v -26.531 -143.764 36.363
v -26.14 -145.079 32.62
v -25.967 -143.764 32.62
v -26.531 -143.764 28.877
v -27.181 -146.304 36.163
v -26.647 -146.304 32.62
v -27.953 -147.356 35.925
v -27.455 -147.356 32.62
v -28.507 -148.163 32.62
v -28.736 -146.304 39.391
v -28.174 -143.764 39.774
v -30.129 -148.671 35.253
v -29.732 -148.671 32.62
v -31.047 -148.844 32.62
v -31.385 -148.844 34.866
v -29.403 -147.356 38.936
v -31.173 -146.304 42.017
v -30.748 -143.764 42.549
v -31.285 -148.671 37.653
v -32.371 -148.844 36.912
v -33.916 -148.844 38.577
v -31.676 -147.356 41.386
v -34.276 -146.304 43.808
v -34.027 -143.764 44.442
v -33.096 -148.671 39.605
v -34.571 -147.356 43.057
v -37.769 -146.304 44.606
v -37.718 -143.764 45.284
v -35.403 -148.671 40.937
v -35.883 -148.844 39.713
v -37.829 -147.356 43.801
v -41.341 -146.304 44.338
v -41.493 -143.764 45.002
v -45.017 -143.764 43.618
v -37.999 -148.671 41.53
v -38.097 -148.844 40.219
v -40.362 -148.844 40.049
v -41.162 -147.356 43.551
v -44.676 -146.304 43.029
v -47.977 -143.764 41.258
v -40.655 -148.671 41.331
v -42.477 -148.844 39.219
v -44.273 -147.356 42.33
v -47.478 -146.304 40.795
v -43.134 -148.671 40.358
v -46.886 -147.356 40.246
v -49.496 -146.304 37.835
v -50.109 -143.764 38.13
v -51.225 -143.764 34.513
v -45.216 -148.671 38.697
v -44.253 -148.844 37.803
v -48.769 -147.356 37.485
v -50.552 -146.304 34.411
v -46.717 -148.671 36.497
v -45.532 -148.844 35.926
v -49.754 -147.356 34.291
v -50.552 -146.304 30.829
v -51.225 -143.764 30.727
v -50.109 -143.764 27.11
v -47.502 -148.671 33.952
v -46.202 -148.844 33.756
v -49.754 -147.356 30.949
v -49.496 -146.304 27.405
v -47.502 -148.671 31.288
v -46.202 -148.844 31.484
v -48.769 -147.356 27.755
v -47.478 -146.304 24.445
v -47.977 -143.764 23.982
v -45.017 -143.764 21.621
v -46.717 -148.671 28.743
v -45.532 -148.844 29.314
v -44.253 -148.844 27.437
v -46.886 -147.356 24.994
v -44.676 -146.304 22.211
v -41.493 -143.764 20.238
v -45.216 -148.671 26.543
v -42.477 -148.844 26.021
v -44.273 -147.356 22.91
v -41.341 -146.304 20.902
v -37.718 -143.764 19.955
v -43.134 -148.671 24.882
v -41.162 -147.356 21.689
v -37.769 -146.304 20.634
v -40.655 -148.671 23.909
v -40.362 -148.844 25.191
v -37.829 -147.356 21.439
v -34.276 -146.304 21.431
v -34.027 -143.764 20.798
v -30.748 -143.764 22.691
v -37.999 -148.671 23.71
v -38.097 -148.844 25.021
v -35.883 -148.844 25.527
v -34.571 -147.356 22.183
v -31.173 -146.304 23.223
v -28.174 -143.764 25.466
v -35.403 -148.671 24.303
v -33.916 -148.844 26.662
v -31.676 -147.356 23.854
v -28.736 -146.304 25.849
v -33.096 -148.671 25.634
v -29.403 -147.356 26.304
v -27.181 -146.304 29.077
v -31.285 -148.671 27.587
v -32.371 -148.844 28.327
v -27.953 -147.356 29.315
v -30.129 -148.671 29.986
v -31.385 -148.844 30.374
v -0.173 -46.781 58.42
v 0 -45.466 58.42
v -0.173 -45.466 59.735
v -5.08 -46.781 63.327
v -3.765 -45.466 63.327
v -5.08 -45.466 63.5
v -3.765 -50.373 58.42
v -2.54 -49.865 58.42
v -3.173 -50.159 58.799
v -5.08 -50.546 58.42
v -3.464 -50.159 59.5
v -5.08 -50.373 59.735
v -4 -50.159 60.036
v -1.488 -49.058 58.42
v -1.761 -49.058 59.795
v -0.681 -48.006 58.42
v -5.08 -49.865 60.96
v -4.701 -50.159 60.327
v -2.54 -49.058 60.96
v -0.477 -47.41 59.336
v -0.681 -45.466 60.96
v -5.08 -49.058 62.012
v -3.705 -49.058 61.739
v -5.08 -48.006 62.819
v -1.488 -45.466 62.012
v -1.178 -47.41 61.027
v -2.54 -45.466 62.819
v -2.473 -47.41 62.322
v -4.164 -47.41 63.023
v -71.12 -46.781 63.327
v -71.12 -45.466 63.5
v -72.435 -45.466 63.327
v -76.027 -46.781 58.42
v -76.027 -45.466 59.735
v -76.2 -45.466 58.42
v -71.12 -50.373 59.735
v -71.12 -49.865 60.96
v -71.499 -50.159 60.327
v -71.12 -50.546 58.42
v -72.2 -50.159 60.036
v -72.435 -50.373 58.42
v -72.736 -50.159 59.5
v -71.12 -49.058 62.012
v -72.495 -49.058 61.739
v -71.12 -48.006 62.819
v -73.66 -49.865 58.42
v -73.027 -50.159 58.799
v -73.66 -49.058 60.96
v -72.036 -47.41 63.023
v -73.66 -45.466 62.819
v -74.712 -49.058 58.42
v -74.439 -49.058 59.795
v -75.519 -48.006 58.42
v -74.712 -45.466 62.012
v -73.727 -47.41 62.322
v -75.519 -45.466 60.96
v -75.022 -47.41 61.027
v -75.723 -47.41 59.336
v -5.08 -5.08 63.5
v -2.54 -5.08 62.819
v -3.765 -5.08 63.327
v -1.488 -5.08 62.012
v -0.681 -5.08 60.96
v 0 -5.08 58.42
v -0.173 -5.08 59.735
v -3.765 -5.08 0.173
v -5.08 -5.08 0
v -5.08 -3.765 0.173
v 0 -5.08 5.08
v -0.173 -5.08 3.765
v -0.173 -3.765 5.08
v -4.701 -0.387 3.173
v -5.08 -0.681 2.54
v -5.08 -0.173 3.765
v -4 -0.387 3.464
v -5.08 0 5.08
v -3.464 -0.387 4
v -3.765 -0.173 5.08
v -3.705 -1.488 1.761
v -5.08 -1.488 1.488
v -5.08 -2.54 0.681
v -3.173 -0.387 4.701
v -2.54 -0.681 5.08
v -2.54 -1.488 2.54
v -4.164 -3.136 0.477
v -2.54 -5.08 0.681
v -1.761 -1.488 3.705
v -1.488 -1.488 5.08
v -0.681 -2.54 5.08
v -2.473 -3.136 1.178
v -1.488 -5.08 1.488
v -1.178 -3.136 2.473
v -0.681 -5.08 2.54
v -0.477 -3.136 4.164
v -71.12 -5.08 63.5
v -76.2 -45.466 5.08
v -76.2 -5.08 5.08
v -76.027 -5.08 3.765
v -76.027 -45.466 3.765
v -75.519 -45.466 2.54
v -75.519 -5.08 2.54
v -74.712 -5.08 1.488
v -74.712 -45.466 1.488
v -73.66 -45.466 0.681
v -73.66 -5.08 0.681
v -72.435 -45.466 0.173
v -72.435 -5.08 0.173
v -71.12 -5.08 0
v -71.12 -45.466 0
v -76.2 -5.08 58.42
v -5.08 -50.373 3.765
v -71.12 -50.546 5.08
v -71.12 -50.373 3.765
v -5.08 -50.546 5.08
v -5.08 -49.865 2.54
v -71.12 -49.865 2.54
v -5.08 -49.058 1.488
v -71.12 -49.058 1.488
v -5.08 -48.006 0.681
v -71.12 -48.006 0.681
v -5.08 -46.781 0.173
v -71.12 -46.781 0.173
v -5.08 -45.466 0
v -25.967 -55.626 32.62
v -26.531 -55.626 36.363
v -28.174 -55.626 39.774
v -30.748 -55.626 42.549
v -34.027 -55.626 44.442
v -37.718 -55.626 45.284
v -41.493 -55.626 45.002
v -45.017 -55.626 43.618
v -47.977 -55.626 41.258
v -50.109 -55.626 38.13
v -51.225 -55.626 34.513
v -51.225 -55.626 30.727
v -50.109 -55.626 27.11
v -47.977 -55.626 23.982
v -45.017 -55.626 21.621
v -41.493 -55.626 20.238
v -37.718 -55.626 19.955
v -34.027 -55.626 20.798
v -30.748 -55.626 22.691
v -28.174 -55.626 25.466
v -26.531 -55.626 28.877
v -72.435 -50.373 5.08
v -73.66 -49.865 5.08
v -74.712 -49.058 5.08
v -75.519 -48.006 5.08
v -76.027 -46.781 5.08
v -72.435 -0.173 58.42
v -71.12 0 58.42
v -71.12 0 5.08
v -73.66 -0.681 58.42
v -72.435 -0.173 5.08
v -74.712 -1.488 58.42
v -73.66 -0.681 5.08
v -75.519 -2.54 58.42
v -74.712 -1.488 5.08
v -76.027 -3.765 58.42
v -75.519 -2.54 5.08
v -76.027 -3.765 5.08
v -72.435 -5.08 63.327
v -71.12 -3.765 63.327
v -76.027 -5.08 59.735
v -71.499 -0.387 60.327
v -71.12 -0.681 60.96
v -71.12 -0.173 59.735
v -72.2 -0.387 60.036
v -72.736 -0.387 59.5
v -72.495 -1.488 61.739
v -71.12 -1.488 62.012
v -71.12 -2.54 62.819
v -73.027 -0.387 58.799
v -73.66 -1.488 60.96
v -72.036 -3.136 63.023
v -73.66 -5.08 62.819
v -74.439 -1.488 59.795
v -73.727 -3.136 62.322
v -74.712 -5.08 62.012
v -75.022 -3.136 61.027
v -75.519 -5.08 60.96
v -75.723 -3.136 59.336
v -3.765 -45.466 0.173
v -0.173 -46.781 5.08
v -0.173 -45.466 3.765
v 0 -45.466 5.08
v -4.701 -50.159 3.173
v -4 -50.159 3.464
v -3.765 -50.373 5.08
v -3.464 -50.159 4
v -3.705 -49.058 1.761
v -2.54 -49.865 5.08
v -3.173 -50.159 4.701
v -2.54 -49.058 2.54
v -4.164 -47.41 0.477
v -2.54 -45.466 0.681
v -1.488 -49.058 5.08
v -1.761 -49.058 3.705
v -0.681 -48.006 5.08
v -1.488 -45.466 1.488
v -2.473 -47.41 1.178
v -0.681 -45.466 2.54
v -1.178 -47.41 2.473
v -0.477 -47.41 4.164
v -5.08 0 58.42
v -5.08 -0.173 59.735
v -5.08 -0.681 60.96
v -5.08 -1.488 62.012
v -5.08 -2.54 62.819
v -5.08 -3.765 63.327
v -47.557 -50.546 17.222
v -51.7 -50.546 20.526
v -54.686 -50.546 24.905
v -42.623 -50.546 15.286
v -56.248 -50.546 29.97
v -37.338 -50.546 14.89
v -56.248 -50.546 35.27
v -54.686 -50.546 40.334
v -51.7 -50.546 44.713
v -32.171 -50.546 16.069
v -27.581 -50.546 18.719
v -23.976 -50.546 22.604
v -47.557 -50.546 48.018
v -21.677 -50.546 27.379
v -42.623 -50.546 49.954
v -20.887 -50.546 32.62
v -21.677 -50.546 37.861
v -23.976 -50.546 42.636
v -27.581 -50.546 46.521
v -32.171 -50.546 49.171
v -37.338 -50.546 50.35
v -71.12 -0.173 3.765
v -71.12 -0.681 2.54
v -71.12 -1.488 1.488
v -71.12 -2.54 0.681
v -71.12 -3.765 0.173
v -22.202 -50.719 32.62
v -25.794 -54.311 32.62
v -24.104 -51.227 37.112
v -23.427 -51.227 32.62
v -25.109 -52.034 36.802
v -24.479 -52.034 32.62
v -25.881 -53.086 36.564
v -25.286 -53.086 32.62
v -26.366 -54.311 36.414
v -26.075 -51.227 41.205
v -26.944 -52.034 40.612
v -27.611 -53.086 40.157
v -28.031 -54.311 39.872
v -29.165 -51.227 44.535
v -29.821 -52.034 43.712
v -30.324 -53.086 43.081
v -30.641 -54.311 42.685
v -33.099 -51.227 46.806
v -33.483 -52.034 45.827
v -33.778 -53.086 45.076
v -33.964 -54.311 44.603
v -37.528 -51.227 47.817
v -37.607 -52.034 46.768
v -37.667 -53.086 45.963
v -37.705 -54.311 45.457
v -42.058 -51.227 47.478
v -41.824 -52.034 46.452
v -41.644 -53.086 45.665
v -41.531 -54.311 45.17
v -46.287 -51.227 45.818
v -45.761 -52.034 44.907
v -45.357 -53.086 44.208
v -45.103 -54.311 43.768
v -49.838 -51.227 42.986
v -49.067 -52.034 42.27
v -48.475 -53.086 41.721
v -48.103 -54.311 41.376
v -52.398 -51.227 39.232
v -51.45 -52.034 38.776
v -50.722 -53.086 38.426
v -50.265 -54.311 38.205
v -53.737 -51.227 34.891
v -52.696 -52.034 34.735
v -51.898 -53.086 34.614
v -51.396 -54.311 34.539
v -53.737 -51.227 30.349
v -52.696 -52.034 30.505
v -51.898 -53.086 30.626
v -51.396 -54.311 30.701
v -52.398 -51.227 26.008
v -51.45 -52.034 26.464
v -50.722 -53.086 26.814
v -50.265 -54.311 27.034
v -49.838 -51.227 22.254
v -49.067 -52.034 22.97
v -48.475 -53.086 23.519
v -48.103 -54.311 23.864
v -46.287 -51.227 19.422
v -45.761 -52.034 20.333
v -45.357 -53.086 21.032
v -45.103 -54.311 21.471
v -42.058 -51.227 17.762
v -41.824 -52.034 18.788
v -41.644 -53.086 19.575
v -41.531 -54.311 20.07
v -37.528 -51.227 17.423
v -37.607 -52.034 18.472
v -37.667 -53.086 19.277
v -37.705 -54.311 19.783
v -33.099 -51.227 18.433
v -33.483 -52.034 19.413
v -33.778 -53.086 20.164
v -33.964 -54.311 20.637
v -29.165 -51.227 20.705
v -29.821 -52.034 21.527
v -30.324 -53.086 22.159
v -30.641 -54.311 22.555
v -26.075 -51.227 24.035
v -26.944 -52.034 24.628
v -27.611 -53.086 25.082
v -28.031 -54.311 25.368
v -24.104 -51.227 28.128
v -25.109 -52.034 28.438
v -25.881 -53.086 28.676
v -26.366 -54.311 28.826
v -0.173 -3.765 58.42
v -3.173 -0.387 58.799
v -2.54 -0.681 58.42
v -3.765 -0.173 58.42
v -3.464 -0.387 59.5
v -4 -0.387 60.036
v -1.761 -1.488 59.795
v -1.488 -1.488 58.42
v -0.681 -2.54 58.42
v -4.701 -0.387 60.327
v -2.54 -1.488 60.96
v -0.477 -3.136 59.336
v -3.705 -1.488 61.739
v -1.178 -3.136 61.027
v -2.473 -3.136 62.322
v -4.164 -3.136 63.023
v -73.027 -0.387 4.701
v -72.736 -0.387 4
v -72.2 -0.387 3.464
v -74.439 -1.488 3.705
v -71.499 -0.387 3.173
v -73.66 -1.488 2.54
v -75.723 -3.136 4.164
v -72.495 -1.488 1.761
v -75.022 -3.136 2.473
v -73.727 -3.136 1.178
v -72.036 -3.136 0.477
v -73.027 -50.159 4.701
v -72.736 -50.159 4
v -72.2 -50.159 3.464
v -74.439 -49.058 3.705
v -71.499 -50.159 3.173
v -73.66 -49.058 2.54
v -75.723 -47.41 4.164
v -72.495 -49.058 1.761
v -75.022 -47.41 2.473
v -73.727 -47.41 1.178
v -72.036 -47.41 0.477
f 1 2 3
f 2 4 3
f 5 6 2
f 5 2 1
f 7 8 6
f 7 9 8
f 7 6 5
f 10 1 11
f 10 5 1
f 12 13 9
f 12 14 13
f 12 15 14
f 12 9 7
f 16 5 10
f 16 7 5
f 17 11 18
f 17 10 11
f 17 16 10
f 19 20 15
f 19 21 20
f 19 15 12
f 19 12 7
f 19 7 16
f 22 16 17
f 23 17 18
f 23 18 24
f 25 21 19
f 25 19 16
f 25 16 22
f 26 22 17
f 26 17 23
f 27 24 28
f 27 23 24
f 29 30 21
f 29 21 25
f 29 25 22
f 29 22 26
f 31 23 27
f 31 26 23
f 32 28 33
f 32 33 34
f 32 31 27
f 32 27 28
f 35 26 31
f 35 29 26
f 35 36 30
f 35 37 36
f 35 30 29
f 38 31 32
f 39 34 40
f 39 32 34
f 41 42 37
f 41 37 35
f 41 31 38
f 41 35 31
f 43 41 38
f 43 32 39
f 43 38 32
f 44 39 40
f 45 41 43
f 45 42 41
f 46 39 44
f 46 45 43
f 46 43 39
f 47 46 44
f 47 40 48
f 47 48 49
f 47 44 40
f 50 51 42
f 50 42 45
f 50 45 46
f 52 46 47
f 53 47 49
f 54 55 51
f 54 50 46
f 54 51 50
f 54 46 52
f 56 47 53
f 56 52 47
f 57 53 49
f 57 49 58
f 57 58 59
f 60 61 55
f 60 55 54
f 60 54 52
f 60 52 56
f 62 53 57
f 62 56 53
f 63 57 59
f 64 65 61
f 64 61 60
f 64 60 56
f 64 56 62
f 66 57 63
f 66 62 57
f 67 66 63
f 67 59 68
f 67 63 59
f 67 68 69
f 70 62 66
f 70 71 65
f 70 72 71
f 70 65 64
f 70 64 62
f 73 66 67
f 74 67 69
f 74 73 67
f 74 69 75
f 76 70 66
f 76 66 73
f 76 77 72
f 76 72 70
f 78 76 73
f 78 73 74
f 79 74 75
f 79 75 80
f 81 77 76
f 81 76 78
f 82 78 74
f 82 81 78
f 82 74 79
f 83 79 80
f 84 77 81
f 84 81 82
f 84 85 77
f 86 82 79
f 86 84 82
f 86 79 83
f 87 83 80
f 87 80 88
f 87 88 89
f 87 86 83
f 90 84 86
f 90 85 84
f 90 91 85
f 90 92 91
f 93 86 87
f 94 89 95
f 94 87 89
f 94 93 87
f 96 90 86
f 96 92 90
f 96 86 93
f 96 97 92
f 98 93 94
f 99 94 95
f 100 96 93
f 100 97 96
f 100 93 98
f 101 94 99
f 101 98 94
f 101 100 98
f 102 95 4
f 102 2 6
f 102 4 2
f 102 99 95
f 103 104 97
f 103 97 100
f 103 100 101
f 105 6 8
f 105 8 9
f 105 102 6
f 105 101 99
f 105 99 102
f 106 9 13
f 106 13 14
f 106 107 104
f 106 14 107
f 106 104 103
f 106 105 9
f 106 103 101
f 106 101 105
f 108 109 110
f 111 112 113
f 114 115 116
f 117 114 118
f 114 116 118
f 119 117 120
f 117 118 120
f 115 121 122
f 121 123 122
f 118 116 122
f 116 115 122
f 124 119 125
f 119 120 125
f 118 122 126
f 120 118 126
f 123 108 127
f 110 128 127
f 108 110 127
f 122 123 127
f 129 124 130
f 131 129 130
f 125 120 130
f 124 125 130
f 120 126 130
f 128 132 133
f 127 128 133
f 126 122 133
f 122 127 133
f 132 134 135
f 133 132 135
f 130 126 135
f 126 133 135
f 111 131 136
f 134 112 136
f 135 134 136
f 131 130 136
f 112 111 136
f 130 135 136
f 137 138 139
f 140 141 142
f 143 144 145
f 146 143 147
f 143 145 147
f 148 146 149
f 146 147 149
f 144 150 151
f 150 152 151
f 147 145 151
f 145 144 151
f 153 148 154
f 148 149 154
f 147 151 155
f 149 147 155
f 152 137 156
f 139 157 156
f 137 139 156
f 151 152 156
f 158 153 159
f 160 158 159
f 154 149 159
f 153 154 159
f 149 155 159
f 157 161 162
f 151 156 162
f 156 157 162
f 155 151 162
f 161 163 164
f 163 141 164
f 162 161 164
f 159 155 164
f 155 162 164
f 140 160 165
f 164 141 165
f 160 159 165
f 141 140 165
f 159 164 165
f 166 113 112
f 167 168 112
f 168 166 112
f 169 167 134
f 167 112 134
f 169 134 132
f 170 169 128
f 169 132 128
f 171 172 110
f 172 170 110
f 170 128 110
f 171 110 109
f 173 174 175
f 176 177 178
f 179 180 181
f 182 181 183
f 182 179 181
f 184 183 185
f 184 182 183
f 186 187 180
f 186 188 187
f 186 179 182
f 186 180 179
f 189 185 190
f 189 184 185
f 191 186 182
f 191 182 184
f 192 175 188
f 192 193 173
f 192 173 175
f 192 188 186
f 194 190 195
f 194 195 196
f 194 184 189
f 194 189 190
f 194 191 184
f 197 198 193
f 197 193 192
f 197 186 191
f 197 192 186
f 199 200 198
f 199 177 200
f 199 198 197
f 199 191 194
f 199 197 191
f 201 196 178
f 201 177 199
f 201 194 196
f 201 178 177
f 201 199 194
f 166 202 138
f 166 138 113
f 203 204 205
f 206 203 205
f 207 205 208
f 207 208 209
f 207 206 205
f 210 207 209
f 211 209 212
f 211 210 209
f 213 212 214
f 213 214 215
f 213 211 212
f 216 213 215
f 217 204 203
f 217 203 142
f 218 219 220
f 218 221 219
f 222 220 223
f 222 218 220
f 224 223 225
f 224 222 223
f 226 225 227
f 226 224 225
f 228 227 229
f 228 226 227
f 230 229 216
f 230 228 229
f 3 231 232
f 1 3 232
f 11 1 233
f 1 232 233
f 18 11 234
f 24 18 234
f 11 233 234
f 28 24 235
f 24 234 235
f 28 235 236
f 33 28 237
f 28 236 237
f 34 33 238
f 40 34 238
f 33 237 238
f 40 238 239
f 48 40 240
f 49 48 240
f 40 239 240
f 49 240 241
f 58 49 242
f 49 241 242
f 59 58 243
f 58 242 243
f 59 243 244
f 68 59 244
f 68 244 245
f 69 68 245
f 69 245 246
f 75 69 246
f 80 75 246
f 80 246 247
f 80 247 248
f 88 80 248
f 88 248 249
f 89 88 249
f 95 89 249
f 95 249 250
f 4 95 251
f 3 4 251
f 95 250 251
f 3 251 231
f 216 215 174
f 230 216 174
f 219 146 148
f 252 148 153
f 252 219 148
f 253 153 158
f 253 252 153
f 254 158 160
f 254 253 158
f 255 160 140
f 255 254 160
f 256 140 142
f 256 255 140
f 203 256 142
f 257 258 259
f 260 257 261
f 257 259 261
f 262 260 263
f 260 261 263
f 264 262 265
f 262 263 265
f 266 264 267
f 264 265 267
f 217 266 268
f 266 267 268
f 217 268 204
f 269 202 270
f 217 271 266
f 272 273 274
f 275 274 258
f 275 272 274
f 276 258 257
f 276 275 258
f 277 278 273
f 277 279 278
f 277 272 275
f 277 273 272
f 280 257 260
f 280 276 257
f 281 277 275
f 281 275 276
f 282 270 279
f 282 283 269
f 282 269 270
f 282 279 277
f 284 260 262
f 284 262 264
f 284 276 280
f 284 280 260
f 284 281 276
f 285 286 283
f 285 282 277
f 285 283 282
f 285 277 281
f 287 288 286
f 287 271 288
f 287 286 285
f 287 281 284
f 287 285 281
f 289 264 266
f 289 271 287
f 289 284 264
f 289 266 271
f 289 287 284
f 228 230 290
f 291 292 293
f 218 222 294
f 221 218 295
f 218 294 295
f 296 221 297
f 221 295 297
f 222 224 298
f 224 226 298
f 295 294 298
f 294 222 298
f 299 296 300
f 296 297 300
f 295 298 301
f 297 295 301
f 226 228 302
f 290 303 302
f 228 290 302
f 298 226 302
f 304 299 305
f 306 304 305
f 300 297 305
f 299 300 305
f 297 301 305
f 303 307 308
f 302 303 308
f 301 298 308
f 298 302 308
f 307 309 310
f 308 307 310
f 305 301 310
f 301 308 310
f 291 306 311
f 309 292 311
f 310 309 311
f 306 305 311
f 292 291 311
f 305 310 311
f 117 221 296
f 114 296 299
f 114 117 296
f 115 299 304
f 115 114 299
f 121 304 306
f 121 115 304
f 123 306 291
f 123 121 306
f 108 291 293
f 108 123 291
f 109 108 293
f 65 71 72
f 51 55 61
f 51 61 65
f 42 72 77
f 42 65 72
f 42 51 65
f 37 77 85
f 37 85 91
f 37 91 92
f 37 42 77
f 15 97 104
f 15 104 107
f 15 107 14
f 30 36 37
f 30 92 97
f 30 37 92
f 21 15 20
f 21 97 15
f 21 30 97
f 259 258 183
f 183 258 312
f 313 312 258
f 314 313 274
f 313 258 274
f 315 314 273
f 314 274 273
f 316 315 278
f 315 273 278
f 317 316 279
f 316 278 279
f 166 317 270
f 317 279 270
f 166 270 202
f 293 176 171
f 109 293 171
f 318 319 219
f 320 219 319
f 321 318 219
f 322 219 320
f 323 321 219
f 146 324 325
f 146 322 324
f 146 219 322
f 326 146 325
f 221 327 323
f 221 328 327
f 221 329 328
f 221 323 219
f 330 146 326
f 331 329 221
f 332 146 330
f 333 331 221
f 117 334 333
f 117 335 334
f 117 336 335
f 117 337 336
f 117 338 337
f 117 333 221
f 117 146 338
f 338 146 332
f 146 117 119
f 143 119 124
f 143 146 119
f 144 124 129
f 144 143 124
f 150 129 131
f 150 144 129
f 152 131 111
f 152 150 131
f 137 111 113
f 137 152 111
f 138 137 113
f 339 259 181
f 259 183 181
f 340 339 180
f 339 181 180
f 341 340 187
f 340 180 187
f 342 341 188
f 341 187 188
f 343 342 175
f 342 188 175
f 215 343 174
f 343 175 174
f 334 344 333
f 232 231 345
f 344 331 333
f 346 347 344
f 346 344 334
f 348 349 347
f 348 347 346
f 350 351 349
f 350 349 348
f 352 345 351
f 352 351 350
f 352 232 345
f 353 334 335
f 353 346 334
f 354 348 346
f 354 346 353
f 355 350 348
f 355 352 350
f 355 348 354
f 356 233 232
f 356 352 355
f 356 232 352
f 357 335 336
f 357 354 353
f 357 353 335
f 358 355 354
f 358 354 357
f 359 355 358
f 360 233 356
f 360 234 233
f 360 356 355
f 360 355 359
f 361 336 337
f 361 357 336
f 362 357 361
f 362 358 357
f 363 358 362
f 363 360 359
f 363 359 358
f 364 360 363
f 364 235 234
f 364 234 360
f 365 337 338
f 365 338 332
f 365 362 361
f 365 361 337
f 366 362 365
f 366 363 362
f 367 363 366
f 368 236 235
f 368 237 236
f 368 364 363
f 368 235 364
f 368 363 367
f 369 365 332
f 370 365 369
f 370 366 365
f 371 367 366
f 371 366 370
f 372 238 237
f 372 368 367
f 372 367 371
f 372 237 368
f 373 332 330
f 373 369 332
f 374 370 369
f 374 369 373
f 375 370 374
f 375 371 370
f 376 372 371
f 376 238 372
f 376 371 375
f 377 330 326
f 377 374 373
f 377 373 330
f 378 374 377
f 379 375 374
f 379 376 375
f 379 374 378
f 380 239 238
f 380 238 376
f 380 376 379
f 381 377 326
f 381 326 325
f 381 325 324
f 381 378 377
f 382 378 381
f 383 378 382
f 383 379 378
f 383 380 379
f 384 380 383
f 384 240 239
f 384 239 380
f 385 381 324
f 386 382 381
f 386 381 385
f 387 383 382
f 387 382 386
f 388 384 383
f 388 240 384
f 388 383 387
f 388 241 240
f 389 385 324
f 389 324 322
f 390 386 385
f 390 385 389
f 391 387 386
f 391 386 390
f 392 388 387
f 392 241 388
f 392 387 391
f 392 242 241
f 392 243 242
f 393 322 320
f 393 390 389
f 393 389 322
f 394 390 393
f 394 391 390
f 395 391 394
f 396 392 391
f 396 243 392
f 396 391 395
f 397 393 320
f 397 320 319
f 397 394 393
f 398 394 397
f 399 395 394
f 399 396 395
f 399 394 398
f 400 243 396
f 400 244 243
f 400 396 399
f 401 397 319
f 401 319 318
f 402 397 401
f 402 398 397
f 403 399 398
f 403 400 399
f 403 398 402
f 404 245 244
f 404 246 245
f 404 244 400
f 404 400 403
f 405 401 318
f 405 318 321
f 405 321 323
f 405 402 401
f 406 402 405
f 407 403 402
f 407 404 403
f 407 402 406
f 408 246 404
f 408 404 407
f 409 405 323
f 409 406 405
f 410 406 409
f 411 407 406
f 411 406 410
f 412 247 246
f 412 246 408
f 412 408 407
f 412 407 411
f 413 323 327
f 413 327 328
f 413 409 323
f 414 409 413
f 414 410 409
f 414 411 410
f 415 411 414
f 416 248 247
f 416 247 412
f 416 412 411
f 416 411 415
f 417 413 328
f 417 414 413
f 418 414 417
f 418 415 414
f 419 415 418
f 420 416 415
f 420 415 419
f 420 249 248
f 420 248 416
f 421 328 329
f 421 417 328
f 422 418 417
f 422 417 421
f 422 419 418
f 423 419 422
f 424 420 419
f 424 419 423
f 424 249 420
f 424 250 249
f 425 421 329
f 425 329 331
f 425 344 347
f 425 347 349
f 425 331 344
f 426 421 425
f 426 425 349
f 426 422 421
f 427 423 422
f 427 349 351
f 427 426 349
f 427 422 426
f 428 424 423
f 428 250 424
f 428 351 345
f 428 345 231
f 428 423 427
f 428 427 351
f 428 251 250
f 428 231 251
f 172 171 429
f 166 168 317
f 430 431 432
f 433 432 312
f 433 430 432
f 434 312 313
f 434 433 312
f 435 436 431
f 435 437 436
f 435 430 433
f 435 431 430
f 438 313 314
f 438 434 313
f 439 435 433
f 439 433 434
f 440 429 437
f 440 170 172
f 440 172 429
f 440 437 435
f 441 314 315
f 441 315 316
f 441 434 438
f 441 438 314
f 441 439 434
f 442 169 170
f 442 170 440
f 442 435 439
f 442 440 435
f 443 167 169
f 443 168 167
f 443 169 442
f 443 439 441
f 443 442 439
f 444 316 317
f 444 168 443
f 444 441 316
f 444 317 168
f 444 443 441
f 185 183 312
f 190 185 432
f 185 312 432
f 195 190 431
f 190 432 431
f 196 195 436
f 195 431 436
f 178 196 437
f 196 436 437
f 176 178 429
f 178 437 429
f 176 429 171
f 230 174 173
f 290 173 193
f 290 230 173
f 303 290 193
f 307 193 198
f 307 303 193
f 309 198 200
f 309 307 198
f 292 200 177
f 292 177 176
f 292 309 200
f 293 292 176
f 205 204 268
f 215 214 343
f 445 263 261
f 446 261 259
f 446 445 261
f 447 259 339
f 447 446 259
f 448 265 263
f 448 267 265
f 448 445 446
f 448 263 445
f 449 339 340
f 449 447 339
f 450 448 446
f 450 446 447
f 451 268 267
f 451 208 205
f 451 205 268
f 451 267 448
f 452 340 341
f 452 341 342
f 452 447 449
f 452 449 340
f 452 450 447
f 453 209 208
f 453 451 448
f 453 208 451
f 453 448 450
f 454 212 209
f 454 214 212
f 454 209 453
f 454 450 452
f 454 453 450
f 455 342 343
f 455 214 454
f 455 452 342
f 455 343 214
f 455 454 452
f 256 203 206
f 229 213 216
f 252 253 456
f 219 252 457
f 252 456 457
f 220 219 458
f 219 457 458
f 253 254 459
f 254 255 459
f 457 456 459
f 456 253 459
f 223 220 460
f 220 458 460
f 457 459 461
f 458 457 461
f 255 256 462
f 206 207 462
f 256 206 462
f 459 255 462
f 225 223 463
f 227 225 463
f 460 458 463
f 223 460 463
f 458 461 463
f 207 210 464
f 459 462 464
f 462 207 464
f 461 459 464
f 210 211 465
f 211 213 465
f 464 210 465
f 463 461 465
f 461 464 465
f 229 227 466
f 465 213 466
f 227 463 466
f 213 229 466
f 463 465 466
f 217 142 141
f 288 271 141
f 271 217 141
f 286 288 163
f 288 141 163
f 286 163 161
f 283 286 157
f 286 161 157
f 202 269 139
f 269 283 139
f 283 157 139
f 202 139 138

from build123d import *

# Parameters (mm, degrees)
F0_W     = 76.2
F0_H     = 63.5
F1_DEPTH = 50.546
F2_R     = 12.7
F3_DEPTH = 98.298
F4_R     = 5.08
F5_R     = 5.08
F6_R     = 5.08


with BuildPart() as f1:
    # F0 (on Front) → F1 (new body)
    with BuildSketch(Plane.XZ):
        with Locations((-38.1, 31.75)):
            Rectangle(F0_W, F0_H)
    extrude(amount=F1_DEPTH)

    # F2 (on face) → F3 (join)
    with BuildSketch(Plane.XZ.offset(50.546)):
        with Locations((-38.666781, 32.61992)):
            Circle(F2_R)
    extrude(amount=F3_DEPTH)

    # F4
    f4_edges = [f1.edges().sort_by_distance(p)[0] for p in [
        (0, -25.273, 0),
        (0, -25.273, 63.5),
        (-76.2, -25.273, 63.5),
        (-76.2, -25.273, 0),
    ]]
    fillet(f4_edges, radius=F4_R)

    # F5
    f5_edges = [f1.edges().sort_by_distance(p)[0] for p in [
        (-38.1, -50.546, 0),
        (-38.1, 0, 0),
    ]]
    fillet(f5_edges, radius=F5_R)

    # F6
    f6_edges = [f1.edges().sort_by_distance(p)[0] for p in [
        (-25.966781, -99.695, 32.61992),
        (-51.366781, -50.546, 32.61992),
        (-51.366781, -148.844, 32.61992),
    ]]
    fillet(f6_edges, radius=F6_R)


solid = f1.part
